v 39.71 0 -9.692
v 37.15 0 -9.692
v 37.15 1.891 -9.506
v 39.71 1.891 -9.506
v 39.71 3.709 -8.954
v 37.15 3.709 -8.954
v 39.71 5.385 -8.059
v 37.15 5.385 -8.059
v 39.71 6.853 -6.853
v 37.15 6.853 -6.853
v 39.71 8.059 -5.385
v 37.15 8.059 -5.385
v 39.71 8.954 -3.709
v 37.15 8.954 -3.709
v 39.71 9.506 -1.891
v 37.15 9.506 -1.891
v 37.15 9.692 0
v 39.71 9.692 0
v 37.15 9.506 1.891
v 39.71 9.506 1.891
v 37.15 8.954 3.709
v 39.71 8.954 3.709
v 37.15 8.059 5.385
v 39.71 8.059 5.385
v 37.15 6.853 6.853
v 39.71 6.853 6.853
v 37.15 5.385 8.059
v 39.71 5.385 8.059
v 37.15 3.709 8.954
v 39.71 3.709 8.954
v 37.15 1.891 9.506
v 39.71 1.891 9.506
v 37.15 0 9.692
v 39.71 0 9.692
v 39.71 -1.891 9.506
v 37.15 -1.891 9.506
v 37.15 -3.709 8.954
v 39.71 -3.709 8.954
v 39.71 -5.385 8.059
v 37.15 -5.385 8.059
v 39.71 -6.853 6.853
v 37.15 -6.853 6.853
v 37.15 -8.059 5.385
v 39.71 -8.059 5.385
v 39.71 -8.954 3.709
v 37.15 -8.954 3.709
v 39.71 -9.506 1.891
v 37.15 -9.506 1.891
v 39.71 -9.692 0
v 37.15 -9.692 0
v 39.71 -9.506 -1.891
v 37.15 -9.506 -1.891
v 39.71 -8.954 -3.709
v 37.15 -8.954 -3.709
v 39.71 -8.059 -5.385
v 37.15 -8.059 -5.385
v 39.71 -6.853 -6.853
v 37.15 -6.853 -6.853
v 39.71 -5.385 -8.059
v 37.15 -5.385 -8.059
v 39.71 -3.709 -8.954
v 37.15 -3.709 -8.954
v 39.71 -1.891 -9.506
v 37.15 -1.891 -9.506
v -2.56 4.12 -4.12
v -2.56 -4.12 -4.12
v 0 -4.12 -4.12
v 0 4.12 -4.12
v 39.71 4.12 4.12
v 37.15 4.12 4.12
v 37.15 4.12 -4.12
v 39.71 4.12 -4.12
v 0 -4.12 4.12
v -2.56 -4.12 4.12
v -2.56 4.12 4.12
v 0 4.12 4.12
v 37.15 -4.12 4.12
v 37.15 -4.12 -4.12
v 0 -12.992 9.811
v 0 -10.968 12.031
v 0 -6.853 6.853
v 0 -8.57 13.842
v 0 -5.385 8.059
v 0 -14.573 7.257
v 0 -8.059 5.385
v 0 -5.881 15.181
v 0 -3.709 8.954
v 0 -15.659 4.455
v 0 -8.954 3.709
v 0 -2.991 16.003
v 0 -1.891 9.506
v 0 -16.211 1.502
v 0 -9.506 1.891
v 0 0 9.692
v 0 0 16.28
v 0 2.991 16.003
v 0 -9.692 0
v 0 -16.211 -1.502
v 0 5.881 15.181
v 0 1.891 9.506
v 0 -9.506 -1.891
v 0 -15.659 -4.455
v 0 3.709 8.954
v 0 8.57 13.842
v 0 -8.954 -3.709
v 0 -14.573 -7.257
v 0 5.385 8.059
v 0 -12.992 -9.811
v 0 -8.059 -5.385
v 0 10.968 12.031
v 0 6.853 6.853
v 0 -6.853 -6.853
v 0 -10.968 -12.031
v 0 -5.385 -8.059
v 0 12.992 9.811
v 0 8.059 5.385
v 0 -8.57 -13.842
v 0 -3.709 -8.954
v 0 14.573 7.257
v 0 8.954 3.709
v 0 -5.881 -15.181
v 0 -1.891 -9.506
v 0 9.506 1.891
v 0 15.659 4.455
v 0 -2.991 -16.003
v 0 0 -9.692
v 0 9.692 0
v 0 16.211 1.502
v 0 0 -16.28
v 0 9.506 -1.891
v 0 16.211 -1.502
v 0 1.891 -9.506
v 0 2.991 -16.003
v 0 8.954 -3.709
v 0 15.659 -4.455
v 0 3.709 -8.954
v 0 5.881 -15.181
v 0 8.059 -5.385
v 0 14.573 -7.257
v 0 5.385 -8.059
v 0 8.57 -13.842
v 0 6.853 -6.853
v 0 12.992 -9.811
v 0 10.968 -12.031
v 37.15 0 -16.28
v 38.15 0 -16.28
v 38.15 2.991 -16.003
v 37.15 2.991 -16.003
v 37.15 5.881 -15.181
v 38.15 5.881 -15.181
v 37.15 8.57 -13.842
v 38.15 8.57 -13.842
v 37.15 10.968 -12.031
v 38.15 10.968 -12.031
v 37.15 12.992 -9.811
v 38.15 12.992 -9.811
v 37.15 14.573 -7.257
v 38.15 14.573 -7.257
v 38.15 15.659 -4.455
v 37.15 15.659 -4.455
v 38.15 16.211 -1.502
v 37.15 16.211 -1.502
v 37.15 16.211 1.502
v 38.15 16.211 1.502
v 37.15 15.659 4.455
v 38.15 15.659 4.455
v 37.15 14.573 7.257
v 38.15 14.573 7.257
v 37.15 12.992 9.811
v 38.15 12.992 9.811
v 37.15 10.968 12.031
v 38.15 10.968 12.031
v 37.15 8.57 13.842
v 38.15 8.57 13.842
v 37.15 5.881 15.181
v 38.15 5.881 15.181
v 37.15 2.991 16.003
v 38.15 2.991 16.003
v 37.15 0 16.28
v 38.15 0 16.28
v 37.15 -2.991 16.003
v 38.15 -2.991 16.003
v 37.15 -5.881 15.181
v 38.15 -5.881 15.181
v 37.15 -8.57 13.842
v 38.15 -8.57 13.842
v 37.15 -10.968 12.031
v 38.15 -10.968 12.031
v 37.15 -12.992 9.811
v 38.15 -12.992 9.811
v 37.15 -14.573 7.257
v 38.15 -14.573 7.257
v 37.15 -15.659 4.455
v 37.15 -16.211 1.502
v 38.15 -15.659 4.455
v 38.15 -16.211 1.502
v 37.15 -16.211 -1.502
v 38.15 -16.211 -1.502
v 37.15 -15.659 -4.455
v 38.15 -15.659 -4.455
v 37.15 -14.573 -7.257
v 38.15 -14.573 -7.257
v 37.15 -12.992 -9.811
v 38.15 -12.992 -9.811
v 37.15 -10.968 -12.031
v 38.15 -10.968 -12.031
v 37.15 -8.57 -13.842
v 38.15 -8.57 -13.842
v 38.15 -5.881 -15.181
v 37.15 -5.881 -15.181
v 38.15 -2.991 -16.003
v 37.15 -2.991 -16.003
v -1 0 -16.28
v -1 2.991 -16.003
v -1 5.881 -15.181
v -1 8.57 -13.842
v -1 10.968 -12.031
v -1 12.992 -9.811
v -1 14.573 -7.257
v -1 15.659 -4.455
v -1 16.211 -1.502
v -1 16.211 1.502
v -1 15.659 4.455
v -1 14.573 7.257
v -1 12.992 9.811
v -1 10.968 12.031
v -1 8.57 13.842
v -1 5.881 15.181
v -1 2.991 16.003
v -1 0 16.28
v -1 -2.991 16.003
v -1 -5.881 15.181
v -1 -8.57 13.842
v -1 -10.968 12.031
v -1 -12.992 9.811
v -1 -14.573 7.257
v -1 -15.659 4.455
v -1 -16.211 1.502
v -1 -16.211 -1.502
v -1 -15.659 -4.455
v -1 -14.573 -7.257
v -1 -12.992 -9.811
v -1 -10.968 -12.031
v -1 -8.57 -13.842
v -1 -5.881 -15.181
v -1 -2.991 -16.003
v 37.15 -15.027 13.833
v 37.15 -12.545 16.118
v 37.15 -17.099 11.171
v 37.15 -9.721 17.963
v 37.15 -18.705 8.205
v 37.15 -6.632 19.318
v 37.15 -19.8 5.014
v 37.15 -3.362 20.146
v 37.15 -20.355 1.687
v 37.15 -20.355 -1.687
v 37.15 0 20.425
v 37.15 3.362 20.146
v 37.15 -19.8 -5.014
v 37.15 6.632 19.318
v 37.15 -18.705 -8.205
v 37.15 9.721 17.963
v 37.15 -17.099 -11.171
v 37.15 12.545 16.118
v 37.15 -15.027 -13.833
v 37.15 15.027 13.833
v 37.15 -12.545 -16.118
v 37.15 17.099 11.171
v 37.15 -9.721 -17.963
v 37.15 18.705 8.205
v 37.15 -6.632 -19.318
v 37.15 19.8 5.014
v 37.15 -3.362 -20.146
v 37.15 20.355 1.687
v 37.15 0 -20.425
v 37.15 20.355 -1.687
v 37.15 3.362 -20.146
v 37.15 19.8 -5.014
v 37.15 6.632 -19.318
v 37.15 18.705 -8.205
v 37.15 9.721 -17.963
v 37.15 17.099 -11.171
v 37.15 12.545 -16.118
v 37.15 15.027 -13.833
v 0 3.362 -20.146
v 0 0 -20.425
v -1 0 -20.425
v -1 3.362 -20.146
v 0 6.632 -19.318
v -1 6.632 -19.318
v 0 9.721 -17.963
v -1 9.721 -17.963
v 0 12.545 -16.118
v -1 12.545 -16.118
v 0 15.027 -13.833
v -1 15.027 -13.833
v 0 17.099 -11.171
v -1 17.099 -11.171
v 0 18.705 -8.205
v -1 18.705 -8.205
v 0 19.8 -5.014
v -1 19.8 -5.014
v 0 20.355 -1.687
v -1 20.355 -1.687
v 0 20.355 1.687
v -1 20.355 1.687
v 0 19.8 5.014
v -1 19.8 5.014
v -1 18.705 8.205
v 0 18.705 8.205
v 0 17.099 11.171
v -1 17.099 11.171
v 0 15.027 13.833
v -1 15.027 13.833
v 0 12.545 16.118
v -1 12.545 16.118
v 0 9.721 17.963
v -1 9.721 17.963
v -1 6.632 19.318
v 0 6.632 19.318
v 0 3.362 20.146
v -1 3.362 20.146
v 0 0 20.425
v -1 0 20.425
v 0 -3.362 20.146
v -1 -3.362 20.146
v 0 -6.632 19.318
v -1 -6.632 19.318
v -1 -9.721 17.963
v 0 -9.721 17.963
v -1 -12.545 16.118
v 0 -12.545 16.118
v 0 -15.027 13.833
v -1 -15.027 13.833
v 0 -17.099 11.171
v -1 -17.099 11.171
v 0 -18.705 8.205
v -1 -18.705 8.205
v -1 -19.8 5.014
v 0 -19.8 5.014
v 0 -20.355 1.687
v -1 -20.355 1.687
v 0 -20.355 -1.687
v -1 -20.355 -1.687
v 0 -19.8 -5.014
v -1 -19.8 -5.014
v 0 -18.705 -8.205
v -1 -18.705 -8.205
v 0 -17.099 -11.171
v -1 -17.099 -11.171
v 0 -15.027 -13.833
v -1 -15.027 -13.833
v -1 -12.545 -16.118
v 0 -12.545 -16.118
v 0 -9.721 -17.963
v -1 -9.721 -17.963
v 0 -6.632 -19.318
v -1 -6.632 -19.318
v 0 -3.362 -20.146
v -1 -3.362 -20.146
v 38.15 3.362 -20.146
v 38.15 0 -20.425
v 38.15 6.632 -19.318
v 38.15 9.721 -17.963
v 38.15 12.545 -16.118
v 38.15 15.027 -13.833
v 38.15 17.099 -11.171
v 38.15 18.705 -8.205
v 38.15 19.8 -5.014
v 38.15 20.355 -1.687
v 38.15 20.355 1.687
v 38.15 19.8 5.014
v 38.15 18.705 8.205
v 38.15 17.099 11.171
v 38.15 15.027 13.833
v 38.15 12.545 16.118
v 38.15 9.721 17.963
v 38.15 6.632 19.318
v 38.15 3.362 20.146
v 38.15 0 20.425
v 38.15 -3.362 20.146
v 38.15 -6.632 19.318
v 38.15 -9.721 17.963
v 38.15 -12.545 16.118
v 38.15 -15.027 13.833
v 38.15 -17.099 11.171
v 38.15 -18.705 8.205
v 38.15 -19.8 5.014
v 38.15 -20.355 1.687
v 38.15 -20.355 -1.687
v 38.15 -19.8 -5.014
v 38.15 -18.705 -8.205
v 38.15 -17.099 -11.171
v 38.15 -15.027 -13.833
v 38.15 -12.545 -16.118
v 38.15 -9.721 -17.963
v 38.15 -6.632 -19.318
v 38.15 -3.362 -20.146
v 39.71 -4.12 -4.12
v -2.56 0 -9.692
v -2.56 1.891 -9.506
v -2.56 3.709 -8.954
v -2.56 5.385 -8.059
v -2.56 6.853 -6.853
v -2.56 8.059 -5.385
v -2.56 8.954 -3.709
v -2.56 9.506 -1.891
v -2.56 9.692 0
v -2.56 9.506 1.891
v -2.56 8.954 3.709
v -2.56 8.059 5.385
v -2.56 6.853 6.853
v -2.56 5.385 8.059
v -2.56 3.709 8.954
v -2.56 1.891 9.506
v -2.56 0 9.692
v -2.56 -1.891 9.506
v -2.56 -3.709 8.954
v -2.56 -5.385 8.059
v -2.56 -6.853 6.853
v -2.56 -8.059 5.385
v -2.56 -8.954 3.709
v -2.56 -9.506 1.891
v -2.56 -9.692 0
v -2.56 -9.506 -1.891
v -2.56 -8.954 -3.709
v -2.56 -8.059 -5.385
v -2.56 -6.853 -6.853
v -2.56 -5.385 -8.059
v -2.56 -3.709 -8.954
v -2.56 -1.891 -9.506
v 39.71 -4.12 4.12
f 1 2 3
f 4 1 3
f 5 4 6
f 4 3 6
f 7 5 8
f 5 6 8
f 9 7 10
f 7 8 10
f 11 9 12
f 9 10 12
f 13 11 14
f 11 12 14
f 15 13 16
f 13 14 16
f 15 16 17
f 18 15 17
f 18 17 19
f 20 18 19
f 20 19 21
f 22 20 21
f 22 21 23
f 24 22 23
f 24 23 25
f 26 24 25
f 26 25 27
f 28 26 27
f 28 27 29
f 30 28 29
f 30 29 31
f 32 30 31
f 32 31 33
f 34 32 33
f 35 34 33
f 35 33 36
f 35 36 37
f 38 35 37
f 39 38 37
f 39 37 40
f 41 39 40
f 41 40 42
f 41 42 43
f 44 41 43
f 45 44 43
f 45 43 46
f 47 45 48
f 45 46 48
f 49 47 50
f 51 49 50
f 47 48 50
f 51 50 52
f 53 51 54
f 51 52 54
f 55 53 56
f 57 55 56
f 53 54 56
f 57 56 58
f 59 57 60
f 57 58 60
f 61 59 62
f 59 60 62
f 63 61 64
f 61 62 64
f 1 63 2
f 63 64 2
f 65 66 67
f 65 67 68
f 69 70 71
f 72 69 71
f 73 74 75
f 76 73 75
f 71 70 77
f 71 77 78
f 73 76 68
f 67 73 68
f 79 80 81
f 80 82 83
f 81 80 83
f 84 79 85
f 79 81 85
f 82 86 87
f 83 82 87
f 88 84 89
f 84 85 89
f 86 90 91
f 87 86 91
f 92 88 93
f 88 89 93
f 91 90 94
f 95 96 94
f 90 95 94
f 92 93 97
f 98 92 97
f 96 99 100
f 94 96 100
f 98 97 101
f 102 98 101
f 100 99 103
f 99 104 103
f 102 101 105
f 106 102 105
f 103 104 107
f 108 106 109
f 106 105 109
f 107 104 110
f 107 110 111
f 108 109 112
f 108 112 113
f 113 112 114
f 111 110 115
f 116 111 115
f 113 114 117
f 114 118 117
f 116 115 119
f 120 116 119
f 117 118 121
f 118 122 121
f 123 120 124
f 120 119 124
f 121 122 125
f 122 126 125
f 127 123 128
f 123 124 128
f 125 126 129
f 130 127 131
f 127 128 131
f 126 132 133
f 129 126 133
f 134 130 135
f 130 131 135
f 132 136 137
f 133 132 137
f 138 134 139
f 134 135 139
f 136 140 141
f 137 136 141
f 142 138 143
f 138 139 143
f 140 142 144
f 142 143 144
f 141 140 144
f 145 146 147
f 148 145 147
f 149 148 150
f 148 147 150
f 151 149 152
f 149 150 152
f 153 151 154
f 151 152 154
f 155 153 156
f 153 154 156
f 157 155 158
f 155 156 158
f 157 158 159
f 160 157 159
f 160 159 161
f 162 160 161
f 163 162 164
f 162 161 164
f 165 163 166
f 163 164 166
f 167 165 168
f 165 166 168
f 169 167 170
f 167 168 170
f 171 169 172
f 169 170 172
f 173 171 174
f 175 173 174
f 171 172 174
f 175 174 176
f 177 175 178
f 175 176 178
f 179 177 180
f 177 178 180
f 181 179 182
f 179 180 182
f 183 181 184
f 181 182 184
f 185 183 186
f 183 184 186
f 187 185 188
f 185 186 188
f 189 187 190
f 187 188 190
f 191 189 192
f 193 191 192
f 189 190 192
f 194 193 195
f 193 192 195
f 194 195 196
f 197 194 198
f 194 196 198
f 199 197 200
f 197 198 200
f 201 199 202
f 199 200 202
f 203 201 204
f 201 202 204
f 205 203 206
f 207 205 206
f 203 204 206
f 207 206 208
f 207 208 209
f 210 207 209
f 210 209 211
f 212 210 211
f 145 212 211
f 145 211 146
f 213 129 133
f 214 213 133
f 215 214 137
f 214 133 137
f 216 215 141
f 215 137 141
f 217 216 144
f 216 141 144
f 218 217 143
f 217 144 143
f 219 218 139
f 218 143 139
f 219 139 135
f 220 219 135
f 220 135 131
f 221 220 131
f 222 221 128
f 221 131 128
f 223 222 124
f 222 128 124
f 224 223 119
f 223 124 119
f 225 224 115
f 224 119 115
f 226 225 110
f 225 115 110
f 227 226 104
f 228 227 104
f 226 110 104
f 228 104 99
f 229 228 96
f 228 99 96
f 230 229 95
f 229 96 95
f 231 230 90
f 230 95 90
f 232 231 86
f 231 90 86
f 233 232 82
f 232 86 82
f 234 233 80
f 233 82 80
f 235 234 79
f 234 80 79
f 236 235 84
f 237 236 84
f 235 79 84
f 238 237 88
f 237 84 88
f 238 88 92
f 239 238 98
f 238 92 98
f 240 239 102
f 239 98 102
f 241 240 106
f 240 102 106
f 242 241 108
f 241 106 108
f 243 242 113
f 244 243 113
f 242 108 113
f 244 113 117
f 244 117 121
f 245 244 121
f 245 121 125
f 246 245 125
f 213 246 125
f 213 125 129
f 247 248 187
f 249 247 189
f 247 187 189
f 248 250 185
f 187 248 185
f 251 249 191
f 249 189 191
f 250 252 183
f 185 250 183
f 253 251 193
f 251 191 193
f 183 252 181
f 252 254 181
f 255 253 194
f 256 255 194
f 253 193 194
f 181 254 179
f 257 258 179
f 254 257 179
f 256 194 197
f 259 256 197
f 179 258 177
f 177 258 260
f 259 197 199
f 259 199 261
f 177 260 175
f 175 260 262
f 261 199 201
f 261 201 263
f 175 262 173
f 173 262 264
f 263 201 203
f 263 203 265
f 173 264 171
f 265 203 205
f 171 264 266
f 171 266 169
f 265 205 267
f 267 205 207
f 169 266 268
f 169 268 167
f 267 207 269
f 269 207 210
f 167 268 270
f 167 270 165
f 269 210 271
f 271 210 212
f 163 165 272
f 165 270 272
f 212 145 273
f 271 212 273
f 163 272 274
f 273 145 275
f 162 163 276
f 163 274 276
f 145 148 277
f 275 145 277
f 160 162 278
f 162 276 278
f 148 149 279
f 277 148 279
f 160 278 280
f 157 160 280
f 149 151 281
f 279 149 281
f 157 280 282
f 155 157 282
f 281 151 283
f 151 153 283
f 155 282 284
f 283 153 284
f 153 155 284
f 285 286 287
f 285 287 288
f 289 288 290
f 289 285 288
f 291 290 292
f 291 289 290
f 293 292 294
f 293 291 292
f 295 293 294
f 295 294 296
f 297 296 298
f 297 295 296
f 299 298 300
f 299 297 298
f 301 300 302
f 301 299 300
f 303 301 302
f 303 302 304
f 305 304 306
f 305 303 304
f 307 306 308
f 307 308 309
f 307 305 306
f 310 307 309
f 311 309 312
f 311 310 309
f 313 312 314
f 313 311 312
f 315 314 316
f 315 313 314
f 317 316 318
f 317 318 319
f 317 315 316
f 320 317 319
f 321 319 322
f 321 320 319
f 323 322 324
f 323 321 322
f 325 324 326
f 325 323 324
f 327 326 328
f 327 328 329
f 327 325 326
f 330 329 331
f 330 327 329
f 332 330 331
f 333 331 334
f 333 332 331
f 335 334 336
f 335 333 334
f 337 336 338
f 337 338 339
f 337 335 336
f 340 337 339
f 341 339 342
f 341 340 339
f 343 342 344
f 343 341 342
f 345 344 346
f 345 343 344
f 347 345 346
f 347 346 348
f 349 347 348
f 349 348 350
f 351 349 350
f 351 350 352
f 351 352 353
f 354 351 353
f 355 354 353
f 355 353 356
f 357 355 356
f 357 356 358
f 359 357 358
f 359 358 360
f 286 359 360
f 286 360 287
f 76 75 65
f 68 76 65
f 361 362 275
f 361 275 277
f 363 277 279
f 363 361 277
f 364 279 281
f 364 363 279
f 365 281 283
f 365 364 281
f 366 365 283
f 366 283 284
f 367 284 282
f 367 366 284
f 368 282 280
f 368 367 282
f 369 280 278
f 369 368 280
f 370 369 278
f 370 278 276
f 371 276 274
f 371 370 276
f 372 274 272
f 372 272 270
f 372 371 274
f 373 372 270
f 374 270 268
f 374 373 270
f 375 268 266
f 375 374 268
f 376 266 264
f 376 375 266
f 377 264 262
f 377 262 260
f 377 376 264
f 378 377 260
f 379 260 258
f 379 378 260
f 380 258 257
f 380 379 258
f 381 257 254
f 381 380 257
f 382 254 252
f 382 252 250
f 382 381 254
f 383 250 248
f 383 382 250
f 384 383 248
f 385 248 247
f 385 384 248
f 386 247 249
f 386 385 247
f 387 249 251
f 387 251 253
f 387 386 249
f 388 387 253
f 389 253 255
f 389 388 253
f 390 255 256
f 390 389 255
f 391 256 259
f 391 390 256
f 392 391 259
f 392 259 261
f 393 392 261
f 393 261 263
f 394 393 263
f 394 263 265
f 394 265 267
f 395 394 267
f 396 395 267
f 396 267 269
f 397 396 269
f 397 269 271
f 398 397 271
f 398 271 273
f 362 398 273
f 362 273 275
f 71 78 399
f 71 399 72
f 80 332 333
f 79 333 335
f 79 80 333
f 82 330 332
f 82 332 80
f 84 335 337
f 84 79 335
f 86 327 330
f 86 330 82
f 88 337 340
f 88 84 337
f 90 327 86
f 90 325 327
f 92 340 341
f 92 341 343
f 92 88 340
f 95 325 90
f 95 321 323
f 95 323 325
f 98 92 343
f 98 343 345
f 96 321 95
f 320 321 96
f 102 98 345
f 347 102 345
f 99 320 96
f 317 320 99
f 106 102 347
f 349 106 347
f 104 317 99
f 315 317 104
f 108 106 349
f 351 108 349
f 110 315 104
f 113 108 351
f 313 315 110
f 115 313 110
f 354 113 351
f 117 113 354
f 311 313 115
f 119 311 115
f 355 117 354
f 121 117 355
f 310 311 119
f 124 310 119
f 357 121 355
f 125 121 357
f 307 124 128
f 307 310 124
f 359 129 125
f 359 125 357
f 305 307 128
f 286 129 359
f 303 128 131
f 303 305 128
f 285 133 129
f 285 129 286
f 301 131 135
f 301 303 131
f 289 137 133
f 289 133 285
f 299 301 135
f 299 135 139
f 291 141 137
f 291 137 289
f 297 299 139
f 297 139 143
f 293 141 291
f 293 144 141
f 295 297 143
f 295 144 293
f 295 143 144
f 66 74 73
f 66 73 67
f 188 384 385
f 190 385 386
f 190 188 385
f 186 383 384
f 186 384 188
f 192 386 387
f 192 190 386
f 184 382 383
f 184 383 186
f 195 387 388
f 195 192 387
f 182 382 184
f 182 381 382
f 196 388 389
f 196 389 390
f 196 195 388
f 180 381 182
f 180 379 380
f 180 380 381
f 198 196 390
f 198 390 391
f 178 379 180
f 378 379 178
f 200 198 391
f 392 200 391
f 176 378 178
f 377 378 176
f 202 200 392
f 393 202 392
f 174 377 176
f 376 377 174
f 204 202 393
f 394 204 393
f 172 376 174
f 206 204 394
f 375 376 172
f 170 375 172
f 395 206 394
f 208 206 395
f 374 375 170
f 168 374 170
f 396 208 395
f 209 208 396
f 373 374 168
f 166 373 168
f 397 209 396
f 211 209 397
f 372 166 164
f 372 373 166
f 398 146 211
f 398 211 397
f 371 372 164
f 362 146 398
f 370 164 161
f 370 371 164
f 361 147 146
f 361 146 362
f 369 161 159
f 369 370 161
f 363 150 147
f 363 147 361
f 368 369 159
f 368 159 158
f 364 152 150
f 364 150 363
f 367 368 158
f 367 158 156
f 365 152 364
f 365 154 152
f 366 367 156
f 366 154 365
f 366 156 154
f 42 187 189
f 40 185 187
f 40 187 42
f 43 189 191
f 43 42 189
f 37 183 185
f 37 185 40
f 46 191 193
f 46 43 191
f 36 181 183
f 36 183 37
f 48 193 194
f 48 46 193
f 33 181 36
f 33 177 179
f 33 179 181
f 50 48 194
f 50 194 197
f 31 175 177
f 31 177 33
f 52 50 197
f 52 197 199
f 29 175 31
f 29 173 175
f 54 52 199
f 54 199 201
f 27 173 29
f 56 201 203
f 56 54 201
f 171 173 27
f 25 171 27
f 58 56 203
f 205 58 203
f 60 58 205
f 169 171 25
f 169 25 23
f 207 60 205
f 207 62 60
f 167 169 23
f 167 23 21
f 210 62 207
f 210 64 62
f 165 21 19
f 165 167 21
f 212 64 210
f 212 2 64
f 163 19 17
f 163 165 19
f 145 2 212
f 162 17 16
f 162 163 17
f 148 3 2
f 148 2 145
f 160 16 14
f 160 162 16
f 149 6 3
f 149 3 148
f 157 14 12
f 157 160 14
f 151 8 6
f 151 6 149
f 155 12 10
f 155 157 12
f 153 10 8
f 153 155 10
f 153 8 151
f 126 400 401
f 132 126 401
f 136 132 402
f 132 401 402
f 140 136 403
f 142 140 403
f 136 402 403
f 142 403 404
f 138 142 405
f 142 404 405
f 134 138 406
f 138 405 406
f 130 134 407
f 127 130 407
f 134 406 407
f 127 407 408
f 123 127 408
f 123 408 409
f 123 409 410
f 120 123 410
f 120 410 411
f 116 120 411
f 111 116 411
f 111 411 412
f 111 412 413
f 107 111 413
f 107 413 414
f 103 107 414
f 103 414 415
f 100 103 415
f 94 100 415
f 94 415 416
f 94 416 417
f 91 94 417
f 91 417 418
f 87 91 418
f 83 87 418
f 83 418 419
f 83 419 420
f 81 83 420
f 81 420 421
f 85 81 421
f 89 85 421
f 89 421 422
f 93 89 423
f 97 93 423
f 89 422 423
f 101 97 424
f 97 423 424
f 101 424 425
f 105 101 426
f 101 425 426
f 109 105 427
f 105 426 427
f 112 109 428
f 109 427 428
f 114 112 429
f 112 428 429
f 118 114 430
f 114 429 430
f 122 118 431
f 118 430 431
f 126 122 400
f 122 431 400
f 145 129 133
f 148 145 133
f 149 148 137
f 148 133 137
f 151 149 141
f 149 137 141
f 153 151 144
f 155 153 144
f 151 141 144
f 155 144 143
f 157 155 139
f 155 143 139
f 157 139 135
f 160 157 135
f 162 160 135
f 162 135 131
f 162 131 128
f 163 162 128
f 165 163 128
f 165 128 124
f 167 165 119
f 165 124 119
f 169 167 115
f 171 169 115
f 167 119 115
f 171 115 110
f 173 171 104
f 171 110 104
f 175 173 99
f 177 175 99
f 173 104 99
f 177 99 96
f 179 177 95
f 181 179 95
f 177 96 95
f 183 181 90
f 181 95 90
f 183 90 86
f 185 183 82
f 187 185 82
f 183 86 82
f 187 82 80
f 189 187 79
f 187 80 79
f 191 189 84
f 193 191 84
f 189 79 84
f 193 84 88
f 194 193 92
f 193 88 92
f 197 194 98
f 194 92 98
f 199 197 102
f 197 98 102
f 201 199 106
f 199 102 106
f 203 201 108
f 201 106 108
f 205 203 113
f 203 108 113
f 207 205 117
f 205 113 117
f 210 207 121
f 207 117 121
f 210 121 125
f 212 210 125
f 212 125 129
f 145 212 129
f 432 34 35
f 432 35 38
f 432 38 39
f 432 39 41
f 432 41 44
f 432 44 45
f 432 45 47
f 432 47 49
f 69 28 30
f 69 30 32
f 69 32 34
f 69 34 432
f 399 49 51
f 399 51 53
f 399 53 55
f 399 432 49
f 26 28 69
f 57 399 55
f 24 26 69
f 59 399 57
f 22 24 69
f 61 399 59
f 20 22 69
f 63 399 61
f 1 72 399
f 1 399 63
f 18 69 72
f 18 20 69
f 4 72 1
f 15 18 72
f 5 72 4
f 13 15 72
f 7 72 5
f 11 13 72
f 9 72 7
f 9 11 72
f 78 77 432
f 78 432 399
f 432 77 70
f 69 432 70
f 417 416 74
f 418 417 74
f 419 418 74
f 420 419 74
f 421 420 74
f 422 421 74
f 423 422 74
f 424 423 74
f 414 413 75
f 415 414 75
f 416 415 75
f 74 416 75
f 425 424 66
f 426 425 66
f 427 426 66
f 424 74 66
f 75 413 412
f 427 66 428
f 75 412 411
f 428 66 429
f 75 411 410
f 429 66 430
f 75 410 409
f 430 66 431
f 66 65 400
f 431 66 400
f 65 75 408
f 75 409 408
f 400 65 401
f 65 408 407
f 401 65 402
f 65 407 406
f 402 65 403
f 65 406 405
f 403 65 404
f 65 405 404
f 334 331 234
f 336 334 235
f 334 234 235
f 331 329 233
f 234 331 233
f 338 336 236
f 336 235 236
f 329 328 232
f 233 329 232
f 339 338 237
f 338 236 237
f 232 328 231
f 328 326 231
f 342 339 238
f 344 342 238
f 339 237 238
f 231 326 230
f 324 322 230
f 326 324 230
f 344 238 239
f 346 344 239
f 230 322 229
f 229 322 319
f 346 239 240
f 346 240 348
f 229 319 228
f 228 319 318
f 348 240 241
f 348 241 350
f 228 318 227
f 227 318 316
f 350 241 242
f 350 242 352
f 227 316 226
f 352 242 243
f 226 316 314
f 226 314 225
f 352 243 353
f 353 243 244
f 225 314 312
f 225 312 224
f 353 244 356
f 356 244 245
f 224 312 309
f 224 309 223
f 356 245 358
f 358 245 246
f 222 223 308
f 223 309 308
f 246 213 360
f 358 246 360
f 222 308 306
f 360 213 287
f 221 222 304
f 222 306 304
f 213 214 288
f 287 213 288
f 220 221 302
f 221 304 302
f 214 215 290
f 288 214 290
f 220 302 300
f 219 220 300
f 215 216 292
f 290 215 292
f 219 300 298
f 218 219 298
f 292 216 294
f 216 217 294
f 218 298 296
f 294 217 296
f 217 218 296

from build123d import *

# Parameters (mm, degrees)
BOSS_EXTRUDE3_DEPTH      = 39.71
BOSS_EXTRUDE3_DEPTH_BACK = 2.56
SKETCH12_R               = 9.692202823
SKETCH12_W               = 8.24061712
SKETCH12_H               = 8.24061712
SKETCH12_9_R             = 20.425
SKETCH12_9_R_2           = 16.28
BOSS_EXTRUDE4_DEPTH      = 1
SKETCH12_11_R            = 16.28
SKETCH12_11_R_2          = 9.692202823
SKETCH12_11_W            = 8.24061712
SKETCH12_11_H            = 8.24061712
BOSS_EXTRUDE6_DEPTH      = 37.15
LPATTERN1_COUNT          = 2
LPATTERN1_PITCH          = 38.15


with BuildPart() as part:
    # Sketch12 → Boss-Extrude3 (new, two sides: drawn at the far end of the back side and taken through both)
    with BuildSketch(Plane(origin=(0, 0, 0), x_dir=(0, 0, -1), z_dir=(1, 0, 0)).offset(-BOSS_EXTRUDE3_DEPTH_BACK)):
        Circle(SKETCH12_R)
        Rectangle(SKETCH12_W, SKETCH12_H, mode=Mode.SUBTRACT)
    extrude(amount=BOSS_EXTRUDE3_DEPTH + BOSS_EXTRUDE3_DEPTH_BACK)

    # Sketch12<11> → Boss-Extrude6 (add)
    # profile 1 of 2: a face of its own
    with BuildSketch(Plane(origin=(0, 0, 0), x_dir=(0, 0, -1), z_dir=(1, 0, 0))):
        Circle(SKETCH12_11_R)
        Circle(SKETCH12_11_R_2, mode=Mode.SUBTRACT)
    # profile 2 of 2: a face of its own
    with BuildSketch(Plane(origin=(0, 0, 0), x_dir=(0, 0, -1), z_dir=(1, 0, 0))):
        Rectangle(SKETCH12_11_W, SKETCH12_11_H)
    extrude(amount=BOSS_EXTRUDE6_DEPTH)


with BuildPart() as body_2:
    # Sketch12<9> → Boss-Extrude4 (new body)
    with BuildSketch(Plane(origin=(0, 0, 0), x_dir=(0, 0, -1), z_dir=(1, 0, 0))):
        Circle(SKETCH12_9_R)
        Circle(SKETCH12_9_R_2, mode=Mode.SUBTRACT)
    boss_extrude4 = extrude(amount=-BOSS_EXTRUDE4_DEPTH)


with BuildPart() as lpattern1_1:
    # LPattern1: Boss-Extrude4 ×2
    with Locations(*[(i * LPATTERN1_PITCH, 0, 0) for i in range(1, LPATTERN1_COUNT)]):
        add(boss_extrude4)


solid = Compound([part.part, body_2.part, lpattern1_1.part])
